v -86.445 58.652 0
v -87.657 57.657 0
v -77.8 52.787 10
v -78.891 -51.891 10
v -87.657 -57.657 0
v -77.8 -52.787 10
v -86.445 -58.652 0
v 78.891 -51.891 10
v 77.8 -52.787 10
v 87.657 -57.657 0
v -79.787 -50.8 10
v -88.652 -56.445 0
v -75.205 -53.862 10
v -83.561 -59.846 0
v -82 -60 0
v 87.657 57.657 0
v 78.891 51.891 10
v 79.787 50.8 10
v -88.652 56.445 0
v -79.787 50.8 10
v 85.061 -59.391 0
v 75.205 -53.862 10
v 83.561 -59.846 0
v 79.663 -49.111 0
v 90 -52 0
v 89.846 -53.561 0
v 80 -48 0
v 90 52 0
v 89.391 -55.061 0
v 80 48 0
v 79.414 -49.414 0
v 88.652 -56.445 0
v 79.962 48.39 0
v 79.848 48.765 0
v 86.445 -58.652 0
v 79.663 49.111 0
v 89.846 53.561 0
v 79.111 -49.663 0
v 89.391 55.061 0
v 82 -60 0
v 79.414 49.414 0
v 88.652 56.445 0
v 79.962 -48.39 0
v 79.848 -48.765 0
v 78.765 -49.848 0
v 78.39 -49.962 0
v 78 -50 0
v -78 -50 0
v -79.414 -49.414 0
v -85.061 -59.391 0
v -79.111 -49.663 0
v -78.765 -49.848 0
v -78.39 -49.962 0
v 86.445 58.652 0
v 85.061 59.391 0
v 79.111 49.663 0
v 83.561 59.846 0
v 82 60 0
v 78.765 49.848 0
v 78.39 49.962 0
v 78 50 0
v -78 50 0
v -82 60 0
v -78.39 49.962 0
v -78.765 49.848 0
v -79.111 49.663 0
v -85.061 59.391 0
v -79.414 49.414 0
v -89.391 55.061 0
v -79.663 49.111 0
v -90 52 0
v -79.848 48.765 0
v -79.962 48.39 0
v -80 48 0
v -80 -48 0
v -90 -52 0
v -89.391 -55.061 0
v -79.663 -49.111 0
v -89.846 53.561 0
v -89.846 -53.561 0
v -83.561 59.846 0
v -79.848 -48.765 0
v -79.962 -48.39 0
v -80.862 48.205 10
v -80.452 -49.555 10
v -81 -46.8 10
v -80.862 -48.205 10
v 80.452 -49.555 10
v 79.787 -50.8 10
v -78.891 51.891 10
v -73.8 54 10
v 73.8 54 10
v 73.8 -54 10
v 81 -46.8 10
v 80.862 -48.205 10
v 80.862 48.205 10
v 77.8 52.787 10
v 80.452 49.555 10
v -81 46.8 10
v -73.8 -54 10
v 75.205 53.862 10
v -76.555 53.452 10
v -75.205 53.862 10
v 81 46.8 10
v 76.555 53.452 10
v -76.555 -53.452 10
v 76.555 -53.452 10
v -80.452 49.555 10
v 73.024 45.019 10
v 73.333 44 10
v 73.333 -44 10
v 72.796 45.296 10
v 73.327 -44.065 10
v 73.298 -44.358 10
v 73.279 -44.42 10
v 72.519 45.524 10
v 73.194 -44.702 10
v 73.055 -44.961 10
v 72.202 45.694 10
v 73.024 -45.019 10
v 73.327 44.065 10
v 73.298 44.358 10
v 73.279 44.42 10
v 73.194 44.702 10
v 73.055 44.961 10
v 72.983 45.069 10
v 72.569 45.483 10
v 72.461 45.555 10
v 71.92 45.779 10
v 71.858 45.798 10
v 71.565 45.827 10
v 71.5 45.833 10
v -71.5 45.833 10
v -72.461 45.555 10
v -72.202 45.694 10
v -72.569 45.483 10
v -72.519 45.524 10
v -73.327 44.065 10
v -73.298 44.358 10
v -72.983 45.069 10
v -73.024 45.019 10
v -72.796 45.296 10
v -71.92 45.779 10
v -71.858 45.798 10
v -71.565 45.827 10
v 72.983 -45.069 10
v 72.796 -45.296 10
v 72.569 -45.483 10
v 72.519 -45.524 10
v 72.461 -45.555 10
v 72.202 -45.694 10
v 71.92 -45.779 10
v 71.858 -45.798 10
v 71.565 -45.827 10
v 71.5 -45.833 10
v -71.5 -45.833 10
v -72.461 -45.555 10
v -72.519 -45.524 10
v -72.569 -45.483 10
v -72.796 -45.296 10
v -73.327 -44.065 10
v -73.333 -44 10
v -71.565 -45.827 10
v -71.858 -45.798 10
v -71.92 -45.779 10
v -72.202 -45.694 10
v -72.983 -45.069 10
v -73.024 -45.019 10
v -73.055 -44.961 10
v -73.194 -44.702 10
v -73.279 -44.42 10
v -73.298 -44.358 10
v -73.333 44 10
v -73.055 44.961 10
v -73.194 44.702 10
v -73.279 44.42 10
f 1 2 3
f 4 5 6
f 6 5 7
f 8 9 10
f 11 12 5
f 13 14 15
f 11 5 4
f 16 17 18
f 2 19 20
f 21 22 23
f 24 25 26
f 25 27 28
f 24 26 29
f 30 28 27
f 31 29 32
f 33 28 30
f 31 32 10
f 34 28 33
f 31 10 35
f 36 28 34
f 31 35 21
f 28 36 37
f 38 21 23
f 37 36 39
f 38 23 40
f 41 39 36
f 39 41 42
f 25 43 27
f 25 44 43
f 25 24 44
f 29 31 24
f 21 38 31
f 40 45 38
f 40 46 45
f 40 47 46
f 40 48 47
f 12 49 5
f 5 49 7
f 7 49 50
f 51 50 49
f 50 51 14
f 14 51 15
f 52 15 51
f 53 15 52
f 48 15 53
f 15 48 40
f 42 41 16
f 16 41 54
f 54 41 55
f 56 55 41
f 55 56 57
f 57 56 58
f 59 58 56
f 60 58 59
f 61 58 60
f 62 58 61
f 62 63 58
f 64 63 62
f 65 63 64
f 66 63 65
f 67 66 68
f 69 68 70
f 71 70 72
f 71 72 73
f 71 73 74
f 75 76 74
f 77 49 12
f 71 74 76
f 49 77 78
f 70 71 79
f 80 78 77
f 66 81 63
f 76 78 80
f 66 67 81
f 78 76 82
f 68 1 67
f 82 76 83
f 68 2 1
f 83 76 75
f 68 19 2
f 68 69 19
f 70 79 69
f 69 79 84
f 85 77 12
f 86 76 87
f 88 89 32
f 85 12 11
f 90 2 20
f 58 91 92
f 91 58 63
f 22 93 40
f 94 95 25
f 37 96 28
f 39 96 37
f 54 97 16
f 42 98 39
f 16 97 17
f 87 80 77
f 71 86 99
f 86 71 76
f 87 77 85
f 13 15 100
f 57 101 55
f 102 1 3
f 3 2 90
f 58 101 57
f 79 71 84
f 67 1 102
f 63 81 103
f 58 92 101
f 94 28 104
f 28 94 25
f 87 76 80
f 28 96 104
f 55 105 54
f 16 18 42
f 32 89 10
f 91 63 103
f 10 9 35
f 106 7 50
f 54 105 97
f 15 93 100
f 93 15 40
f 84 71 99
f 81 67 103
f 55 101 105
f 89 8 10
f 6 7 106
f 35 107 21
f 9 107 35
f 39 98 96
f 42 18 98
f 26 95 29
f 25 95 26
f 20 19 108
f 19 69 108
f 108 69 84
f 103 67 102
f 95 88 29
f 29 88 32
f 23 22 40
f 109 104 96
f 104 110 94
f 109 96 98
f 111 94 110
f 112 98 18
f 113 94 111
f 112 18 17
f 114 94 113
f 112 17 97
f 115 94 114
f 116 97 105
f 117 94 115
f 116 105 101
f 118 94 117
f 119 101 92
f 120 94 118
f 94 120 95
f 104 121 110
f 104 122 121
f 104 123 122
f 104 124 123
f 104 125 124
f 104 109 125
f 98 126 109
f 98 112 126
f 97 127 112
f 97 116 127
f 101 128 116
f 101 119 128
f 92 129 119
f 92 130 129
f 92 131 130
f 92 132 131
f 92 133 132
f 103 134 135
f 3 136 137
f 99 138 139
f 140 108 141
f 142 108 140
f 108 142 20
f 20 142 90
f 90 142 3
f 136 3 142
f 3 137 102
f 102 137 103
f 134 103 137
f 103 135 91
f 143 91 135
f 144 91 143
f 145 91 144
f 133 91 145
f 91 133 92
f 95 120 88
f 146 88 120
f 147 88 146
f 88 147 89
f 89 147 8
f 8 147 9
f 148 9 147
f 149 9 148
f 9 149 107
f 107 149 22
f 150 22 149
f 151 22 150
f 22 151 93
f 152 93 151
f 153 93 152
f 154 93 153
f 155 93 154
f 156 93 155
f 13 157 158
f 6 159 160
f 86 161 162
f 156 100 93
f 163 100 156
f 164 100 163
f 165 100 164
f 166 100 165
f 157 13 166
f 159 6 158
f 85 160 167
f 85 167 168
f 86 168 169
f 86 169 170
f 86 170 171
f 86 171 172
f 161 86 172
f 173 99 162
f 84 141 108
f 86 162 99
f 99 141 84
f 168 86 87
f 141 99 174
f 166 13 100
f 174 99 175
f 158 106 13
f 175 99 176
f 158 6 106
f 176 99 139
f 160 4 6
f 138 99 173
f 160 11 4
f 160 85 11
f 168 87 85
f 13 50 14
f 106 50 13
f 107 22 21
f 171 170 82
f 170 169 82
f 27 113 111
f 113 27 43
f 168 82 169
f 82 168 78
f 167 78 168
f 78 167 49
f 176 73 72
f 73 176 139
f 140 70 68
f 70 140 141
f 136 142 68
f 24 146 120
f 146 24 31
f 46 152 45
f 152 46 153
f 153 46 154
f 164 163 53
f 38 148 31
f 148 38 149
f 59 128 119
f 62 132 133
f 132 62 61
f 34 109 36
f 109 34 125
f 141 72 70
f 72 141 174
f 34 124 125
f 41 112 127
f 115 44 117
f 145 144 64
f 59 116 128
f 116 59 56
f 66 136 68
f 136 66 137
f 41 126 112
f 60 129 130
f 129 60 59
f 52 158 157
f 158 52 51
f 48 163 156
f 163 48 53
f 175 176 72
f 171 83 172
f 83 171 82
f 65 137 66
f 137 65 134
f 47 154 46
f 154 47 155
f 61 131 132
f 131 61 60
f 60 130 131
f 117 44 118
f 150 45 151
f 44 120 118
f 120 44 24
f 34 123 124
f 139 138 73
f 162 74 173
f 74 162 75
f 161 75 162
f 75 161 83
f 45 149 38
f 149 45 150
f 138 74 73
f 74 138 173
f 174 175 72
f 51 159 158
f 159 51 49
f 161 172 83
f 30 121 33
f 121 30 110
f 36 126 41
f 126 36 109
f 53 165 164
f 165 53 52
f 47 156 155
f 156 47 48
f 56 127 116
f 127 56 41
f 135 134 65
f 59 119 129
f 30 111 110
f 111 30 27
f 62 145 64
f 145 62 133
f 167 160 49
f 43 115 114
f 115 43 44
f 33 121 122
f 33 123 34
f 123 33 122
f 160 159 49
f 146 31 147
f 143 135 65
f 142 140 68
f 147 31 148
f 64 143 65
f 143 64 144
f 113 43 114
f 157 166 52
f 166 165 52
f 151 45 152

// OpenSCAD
$fn = 32;

// ----------------------------------------------------------------------
// Display bezel: 180 x 120 mm frame, opening 160x100 mm
// ----------------------------------------------------------------------

// --- parameters (mm) ---
length = 180;             // frame outside length, X
width = 120;              // frame outside width, Y
frame_w = 10;             // frame width
thickness = 10;           // frame thickness
corner_r = 8;             // outside corner radius
chamfer = 0.9;            // outer wall taper
funnel = 0.9;             // inner opening taper
opening_l = 160;          // opening length
opening_w = 100;          // opening width
inner_r = 2;              // opening corner radius

/* rounded-rectangle outlines, generated with loops */
module rounded_ring(l_nom, w_nom, r) {
  hull() {
    for (sx = [-1, 1]) for (sy = [-1, 1])
      translate([sx * (l_nom / 2 - r), sy * (w_nom / 2 - r)]) circle(r = r);
  }
}

difference() {
  /* frame body, drafted so the outer edge is a variable-depth chamfer */
  linear_extrude(height = thickness, scale = chamfer)
    rounded_ring(length, width, corner_r);
  /* viewing opening, drafted the other way for a funnel edge */
  linear_extrude(height = thickness + 2, scale = funnel)
    translate([0, 0, -1]) rounded_ring(opening_l, opening_w, inner_r);
}
